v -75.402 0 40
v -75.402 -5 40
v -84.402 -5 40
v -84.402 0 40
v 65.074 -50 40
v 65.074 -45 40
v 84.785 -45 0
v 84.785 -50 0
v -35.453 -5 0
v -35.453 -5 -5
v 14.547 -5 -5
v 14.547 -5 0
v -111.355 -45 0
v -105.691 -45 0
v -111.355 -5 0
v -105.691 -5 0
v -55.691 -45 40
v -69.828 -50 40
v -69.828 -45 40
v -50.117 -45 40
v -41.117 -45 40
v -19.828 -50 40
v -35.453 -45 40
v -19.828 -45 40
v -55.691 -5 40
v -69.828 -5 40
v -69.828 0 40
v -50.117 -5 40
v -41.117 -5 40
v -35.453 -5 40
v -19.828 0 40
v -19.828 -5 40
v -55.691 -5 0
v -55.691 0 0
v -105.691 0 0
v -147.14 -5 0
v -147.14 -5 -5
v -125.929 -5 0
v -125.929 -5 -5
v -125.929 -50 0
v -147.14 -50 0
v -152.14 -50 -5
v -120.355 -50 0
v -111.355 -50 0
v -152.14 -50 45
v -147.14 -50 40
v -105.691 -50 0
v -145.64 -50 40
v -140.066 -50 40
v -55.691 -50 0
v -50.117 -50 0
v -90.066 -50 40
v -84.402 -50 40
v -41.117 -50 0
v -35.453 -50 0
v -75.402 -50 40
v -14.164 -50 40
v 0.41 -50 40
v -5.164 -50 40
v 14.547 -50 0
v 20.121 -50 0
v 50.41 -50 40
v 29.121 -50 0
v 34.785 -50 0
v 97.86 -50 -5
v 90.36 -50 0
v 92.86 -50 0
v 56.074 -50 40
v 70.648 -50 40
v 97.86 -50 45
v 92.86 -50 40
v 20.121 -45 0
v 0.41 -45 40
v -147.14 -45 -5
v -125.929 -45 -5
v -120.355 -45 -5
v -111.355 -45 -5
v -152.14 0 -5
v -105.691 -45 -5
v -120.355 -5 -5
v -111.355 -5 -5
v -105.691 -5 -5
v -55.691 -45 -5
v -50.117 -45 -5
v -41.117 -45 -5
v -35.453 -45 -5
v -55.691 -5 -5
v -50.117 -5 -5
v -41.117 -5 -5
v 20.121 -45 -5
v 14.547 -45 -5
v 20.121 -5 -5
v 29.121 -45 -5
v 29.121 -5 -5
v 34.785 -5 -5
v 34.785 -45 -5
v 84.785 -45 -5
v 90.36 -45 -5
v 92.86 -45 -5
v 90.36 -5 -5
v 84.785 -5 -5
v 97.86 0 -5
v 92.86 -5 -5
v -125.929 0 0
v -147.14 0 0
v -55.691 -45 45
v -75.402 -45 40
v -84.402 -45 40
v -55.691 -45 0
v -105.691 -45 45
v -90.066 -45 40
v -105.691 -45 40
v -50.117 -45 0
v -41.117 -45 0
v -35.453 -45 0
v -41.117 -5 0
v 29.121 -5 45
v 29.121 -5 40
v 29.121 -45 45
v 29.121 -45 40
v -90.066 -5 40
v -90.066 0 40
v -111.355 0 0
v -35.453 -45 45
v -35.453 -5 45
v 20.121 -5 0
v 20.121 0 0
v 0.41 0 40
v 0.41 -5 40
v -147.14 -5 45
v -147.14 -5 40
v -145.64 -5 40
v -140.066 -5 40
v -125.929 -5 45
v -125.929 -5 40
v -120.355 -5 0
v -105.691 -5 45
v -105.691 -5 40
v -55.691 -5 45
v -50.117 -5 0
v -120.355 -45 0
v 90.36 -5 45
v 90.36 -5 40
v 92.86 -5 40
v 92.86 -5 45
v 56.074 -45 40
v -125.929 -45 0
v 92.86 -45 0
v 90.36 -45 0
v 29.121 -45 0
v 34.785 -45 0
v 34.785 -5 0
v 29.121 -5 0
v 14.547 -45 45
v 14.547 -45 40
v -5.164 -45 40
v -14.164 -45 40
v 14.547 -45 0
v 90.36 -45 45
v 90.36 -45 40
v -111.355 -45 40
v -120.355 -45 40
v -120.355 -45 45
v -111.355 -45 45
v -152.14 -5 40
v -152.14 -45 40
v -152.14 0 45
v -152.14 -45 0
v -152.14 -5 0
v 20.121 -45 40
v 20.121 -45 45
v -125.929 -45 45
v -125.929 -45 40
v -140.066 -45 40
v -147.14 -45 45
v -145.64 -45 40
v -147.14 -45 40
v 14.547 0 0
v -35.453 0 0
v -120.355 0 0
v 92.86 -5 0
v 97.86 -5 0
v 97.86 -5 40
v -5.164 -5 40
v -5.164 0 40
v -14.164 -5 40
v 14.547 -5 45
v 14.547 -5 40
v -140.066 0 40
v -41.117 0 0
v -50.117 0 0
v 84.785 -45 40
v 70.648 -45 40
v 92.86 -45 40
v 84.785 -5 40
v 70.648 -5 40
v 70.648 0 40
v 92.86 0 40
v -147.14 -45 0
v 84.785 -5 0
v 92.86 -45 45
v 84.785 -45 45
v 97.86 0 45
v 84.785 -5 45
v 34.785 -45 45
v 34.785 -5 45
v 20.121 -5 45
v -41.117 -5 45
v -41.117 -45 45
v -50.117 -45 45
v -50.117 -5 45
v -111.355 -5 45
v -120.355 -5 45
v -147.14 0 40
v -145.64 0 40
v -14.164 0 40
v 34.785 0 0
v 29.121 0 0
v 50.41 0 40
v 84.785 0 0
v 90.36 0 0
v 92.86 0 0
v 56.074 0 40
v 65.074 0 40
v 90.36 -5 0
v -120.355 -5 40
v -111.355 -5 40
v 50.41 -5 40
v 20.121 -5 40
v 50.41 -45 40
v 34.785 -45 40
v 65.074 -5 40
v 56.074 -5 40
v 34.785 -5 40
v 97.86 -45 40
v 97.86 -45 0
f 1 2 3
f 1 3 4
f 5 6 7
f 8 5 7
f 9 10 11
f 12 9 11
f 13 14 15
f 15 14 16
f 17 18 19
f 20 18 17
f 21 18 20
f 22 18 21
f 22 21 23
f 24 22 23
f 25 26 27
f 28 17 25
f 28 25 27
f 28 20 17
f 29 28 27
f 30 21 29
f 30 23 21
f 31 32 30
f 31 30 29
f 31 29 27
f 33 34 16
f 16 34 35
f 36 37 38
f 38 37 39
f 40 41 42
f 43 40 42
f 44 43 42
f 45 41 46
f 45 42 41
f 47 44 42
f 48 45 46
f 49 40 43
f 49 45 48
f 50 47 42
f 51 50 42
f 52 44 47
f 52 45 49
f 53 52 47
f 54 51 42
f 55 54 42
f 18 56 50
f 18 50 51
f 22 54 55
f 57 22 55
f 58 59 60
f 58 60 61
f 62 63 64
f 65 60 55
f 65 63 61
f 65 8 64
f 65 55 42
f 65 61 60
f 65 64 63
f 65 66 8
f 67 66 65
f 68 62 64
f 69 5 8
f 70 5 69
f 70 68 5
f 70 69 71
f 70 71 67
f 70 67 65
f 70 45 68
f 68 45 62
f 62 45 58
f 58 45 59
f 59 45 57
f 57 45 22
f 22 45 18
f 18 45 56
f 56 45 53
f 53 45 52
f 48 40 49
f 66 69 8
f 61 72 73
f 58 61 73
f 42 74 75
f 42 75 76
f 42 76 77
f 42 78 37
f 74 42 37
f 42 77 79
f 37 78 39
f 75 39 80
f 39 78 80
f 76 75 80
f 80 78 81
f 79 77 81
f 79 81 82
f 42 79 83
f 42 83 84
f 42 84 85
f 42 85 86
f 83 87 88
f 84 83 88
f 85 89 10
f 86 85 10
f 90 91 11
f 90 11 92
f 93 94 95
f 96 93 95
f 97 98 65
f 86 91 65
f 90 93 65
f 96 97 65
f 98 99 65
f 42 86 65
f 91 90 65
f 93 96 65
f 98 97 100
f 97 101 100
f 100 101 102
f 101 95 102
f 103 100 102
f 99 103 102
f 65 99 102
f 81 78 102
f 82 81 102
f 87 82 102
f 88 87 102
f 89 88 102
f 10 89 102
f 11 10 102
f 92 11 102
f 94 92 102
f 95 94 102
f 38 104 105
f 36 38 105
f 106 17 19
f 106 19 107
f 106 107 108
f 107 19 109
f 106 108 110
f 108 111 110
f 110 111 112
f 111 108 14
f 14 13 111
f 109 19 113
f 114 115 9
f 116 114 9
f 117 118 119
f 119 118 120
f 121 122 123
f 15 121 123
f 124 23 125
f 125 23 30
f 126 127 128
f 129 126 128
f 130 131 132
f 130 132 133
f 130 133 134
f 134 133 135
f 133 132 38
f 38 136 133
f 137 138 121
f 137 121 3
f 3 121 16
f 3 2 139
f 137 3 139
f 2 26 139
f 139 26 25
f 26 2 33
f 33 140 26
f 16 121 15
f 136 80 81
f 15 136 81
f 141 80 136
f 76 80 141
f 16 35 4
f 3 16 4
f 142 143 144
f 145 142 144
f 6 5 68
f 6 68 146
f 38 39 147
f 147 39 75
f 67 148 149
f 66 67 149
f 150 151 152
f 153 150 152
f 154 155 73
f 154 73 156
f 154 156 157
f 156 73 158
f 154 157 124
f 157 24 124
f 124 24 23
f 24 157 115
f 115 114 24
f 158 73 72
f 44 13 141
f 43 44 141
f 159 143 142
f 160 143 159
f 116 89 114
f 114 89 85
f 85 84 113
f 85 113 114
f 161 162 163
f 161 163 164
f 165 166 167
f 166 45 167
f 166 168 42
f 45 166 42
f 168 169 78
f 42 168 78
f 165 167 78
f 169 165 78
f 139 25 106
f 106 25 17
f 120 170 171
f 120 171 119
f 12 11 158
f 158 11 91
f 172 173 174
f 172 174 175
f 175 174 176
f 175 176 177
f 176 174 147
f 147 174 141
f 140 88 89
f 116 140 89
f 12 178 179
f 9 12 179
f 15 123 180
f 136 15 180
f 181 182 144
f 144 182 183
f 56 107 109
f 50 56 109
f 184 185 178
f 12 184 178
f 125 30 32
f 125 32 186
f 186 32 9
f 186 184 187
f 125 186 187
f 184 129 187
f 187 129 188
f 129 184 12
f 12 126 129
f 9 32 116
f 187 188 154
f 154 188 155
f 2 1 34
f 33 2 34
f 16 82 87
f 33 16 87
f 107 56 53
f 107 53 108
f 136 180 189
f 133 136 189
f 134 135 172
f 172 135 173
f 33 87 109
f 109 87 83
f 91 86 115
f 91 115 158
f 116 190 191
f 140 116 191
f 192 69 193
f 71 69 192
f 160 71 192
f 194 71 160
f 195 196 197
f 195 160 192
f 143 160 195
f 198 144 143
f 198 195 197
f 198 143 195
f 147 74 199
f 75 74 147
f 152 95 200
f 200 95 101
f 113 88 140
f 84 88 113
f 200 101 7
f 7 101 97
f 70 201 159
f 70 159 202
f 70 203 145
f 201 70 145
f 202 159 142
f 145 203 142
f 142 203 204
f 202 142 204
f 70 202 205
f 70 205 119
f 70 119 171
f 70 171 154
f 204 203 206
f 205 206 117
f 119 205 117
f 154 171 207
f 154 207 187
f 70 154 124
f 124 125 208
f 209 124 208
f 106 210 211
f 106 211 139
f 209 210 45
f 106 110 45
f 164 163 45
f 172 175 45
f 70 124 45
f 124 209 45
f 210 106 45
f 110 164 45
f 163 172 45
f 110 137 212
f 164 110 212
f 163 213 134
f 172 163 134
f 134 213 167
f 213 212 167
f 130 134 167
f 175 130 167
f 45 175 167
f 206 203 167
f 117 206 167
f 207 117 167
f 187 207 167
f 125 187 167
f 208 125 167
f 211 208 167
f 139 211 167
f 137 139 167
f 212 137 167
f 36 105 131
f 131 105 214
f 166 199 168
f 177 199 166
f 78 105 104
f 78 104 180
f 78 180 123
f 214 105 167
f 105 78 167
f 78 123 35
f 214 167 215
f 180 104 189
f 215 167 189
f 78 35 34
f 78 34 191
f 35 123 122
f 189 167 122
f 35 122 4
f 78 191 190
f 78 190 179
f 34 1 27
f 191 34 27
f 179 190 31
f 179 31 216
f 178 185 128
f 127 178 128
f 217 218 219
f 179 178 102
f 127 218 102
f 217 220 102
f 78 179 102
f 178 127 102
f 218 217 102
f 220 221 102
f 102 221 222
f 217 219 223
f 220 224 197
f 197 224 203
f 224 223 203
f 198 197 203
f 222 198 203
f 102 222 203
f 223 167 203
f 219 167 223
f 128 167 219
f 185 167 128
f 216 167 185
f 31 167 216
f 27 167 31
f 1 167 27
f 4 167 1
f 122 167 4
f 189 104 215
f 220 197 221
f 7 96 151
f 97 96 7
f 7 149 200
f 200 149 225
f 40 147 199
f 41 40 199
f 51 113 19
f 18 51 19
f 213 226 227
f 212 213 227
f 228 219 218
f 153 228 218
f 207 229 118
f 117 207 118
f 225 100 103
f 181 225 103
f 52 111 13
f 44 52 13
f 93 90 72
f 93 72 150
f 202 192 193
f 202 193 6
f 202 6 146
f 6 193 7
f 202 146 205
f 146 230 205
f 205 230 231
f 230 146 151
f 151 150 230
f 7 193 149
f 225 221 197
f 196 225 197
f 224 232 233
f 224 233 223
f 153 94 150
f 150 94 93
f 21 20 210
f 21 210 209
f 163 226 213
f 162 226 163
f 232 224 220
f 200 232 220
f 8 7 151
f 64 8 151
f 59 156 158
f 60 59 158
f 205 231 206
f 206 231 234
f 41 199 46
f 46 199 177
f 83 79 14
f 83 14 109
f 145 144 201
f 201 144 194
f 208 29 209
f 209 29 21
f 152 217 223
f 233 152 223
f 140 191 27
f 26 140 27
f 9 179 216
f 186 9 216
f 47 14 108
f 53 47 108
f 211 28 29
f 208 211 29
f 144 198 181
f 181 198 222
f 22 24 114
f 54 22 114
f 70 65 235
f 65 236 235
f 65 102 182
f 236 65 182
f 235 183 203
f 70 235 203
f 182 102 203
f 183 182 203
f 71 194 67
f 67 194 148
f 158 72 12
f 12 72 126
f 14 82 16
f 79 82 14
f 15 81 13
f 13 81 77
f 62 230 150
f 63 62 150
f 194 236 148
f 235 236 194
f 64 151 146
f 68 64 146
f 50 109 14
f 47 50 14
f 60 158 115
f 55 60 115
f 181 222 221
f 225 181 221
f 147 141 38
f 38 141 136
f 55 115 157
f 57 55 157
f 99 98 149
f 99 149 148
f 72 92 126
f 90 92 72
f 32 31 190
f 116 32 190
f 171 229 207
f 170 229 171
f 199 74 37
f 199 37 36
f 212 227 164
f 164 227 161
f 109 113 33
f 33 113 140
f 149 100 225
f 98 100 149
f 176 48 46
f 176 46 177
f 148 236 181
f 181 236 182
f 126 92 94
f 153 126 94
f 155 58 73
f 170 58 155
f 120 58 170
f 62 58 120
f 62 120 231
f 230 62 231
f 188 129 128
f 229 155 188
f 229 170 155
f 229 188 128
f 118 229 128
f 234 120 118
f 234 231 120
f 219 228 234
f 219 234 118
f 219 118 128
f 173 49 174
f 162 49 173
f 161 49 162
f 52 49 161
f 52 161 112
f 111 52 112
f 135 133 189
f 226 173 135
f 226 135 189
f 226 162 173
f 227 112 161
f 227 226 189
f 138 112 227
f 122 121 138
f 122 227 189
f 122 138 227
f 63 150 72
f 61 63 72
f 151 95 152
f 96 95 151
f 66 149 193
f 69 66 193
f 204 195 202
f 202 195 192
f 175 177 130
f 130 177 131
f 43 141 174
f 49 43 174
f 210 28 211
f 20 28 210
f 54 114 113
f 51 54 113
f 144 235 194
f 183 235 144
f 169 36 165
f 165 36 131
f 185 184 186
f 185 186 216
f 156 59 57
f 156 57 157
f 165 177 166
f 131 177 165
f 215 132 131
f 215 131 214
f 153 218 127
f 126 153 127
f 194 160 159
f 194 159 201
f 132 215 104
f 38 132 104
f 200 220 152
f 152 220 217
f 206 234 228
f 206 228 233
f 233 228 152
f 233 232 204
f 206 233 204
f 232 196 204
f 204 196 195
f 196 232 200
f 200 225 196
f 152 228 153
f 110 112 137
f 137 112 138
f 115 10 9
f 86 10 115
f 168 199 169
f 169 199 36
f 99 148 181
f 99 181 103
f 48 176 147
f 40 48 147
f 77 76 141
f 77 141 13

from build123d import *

# Parameters (mm, degrees)
F1_DEPTH = 50
F2_W     = 2.5
F2_H     = 40
F2_W_2   = 50
F2_W_3   = 9
F2_W_4   = 21.211368
F3_DEPTH = 5
F4_W     = 40
F4_H     = 40
F5_DEPTH = 350
F6_W     = 9
F6_H     = 40
F6_W_2   = 2.5
F7_DEPTH = 25


with BuildPart() as f1:
    # F0 (on Front) → F1 (new body)
    with BuildSketch(Plane.XZ):
        Polygon((97.859602, 45), (-152.140398, 45), (-152.140398, -5), (97.859602, -5), (97.859602, 0), align=None)
        Polygon((-147.140398, 40), (-145.640398, 40), (-125.92903, 0), (-147.140398, 0), align=None, mode=Mode.SUBTRACT)
        Polygon((-90.06627, 40), (-111.354901, 0), (-120.354901, 0), (-140.06627, 40), align=None, mode=Mode.SUBTRACT)
        Polygon((-55.690862, 0), (-105.690862, 0), (-84.402231, 40), (-75.402231, 40), align=None, mode=Mode.SUBTRACT)
        Polygon((-50.116734, 0), (-69.828102, 40), (-19.828102, 40), (-41.116734, 0), align=None, mode=Mode.SUBTRACT)
        Polygon((-14.164063, 40), (-5.164063, 40), (14.547306, 0), (-35.452694, 0), align=None, mode=Mode.SUBTRACT)
        Polygon((20.121434, 0), (0.410065, 40), (50.410065, 40), (29.121434, 0), align=None, mode=Mode.SUBTRACT)
        Polygon((65.074105, 40), (84.785473, 0), (34.785473, 0), (56.074105, 40), align=None, mode=Mode.SUBTRACT)
        Polygon((92.859602, 40), (92.859602, 0), (90.359602, 0), (70.648233, 40), align=None, mode=Mode.SUBTRACT)
    extrude(amount=F1_DEPTH)

    # F2 (on face) → F3 (cut)
    with BuildSketch(Plane(origin=(0, 0, -5), x_dir=(1, 0, 0), z_dir=(0, 0, -1))):
        with Locations((91.609602, 25)):
            Rectangle(F2_W, F2_H)
        with Locations((59.785473, 25)):
            Rectangle(F2_W_2, F2_H)
        with Locations((-10.452694, 25)):
            Rectangle(F2_W_2, F2_H)
        with Locations((24.621434, 25)):
            Rectangle(F2_W_3, F2_H)
        with Locations((-80.690862, 25)):
            Rectangle(F2_W_2, F2_H)
        with Locations((-45.616734, 25)):
            Rectangle(F2_W_3, F2_H)
        with Locations((-136.534714, 25)):
            Rectangle(F2_W_4, F2_H)
        with Locations((-115.854901, 25)):
            Rectangle(F2_W_3, F2_H)
    extrude(amount=-F3_DEPTH, mode=Mode.SUBTRACT)

    # F4 (on face) → F5 (cut)
    with BuildSketch(Plane.YZ.offset(97.859602)):
        with Locations((-25, 20)):
            Rectangle(F4_W, F4_H)
    extrude(amount=-F5_DEPTH, mode=Mode.SUBTRACT)

    # F6 (on face) → F7 (cut)
    with BuildSketch(Plane(origin=(0, 0, 40), x_dir=(1, 0, 0), z_dir=(0, 0, -1))):
        Polygon((-145.640398, 5), (-140.06627, 5), (-125.92903, 5), (-125.92903, 45), (-140.06627, 45), (-145.640398, 45), (-147.140398, 45), (-147.140398, 5), align=None)
        with Locations((-115.854901, 25)):
            Rectangle(F6_W, F6_H)
        Polygon((-5.164063, 5), (0.410065, 5), (14.547306, 5), (14.547306, 45), (0.410065, 45), (-5.164063, 45), (-14.164063, 45), (-19.828102, 45), (-35.452694, 45), (-35.452694, 5), (-19.828102, 5), (-14.164063, 5), align=None)
        Polygon((-75.402231, 5), (-69.828102, 5), (-55.690862, 5), (-55.690862, 45), (-69.828102, 45), (-75.402231, 45), (-84.402231, 45), (-90.06627, 45), (-105.690862, 45), (-105.690862, 5), (-90.06627, 5), (-84.402231, 5), align=None)
        with Locations((-45.616734, 25)):
            Rectangle(F6_W, F6_H)
        with Locations((24.621434, 25)):
            Rectangle(F6_W, F6_H)
        Polygon((65.074105, 5), (70.648233, 5), (84.785473, 5), (84.785473, 45), (70.648233, 45), (65.074105, 45), (56.074105, 45), (50.410065, 45), (34.785473, 45), (34.785473, 5), (50.410065, 5), (56.074105, 5), align=None)
        with Locations((91.609602, 25)):
            Rectangle(F6_W_2, F6_H)
    extrude(amount=-F7_DEPTH, mode=Mode.SUBTRACT)


solid = f1.part
